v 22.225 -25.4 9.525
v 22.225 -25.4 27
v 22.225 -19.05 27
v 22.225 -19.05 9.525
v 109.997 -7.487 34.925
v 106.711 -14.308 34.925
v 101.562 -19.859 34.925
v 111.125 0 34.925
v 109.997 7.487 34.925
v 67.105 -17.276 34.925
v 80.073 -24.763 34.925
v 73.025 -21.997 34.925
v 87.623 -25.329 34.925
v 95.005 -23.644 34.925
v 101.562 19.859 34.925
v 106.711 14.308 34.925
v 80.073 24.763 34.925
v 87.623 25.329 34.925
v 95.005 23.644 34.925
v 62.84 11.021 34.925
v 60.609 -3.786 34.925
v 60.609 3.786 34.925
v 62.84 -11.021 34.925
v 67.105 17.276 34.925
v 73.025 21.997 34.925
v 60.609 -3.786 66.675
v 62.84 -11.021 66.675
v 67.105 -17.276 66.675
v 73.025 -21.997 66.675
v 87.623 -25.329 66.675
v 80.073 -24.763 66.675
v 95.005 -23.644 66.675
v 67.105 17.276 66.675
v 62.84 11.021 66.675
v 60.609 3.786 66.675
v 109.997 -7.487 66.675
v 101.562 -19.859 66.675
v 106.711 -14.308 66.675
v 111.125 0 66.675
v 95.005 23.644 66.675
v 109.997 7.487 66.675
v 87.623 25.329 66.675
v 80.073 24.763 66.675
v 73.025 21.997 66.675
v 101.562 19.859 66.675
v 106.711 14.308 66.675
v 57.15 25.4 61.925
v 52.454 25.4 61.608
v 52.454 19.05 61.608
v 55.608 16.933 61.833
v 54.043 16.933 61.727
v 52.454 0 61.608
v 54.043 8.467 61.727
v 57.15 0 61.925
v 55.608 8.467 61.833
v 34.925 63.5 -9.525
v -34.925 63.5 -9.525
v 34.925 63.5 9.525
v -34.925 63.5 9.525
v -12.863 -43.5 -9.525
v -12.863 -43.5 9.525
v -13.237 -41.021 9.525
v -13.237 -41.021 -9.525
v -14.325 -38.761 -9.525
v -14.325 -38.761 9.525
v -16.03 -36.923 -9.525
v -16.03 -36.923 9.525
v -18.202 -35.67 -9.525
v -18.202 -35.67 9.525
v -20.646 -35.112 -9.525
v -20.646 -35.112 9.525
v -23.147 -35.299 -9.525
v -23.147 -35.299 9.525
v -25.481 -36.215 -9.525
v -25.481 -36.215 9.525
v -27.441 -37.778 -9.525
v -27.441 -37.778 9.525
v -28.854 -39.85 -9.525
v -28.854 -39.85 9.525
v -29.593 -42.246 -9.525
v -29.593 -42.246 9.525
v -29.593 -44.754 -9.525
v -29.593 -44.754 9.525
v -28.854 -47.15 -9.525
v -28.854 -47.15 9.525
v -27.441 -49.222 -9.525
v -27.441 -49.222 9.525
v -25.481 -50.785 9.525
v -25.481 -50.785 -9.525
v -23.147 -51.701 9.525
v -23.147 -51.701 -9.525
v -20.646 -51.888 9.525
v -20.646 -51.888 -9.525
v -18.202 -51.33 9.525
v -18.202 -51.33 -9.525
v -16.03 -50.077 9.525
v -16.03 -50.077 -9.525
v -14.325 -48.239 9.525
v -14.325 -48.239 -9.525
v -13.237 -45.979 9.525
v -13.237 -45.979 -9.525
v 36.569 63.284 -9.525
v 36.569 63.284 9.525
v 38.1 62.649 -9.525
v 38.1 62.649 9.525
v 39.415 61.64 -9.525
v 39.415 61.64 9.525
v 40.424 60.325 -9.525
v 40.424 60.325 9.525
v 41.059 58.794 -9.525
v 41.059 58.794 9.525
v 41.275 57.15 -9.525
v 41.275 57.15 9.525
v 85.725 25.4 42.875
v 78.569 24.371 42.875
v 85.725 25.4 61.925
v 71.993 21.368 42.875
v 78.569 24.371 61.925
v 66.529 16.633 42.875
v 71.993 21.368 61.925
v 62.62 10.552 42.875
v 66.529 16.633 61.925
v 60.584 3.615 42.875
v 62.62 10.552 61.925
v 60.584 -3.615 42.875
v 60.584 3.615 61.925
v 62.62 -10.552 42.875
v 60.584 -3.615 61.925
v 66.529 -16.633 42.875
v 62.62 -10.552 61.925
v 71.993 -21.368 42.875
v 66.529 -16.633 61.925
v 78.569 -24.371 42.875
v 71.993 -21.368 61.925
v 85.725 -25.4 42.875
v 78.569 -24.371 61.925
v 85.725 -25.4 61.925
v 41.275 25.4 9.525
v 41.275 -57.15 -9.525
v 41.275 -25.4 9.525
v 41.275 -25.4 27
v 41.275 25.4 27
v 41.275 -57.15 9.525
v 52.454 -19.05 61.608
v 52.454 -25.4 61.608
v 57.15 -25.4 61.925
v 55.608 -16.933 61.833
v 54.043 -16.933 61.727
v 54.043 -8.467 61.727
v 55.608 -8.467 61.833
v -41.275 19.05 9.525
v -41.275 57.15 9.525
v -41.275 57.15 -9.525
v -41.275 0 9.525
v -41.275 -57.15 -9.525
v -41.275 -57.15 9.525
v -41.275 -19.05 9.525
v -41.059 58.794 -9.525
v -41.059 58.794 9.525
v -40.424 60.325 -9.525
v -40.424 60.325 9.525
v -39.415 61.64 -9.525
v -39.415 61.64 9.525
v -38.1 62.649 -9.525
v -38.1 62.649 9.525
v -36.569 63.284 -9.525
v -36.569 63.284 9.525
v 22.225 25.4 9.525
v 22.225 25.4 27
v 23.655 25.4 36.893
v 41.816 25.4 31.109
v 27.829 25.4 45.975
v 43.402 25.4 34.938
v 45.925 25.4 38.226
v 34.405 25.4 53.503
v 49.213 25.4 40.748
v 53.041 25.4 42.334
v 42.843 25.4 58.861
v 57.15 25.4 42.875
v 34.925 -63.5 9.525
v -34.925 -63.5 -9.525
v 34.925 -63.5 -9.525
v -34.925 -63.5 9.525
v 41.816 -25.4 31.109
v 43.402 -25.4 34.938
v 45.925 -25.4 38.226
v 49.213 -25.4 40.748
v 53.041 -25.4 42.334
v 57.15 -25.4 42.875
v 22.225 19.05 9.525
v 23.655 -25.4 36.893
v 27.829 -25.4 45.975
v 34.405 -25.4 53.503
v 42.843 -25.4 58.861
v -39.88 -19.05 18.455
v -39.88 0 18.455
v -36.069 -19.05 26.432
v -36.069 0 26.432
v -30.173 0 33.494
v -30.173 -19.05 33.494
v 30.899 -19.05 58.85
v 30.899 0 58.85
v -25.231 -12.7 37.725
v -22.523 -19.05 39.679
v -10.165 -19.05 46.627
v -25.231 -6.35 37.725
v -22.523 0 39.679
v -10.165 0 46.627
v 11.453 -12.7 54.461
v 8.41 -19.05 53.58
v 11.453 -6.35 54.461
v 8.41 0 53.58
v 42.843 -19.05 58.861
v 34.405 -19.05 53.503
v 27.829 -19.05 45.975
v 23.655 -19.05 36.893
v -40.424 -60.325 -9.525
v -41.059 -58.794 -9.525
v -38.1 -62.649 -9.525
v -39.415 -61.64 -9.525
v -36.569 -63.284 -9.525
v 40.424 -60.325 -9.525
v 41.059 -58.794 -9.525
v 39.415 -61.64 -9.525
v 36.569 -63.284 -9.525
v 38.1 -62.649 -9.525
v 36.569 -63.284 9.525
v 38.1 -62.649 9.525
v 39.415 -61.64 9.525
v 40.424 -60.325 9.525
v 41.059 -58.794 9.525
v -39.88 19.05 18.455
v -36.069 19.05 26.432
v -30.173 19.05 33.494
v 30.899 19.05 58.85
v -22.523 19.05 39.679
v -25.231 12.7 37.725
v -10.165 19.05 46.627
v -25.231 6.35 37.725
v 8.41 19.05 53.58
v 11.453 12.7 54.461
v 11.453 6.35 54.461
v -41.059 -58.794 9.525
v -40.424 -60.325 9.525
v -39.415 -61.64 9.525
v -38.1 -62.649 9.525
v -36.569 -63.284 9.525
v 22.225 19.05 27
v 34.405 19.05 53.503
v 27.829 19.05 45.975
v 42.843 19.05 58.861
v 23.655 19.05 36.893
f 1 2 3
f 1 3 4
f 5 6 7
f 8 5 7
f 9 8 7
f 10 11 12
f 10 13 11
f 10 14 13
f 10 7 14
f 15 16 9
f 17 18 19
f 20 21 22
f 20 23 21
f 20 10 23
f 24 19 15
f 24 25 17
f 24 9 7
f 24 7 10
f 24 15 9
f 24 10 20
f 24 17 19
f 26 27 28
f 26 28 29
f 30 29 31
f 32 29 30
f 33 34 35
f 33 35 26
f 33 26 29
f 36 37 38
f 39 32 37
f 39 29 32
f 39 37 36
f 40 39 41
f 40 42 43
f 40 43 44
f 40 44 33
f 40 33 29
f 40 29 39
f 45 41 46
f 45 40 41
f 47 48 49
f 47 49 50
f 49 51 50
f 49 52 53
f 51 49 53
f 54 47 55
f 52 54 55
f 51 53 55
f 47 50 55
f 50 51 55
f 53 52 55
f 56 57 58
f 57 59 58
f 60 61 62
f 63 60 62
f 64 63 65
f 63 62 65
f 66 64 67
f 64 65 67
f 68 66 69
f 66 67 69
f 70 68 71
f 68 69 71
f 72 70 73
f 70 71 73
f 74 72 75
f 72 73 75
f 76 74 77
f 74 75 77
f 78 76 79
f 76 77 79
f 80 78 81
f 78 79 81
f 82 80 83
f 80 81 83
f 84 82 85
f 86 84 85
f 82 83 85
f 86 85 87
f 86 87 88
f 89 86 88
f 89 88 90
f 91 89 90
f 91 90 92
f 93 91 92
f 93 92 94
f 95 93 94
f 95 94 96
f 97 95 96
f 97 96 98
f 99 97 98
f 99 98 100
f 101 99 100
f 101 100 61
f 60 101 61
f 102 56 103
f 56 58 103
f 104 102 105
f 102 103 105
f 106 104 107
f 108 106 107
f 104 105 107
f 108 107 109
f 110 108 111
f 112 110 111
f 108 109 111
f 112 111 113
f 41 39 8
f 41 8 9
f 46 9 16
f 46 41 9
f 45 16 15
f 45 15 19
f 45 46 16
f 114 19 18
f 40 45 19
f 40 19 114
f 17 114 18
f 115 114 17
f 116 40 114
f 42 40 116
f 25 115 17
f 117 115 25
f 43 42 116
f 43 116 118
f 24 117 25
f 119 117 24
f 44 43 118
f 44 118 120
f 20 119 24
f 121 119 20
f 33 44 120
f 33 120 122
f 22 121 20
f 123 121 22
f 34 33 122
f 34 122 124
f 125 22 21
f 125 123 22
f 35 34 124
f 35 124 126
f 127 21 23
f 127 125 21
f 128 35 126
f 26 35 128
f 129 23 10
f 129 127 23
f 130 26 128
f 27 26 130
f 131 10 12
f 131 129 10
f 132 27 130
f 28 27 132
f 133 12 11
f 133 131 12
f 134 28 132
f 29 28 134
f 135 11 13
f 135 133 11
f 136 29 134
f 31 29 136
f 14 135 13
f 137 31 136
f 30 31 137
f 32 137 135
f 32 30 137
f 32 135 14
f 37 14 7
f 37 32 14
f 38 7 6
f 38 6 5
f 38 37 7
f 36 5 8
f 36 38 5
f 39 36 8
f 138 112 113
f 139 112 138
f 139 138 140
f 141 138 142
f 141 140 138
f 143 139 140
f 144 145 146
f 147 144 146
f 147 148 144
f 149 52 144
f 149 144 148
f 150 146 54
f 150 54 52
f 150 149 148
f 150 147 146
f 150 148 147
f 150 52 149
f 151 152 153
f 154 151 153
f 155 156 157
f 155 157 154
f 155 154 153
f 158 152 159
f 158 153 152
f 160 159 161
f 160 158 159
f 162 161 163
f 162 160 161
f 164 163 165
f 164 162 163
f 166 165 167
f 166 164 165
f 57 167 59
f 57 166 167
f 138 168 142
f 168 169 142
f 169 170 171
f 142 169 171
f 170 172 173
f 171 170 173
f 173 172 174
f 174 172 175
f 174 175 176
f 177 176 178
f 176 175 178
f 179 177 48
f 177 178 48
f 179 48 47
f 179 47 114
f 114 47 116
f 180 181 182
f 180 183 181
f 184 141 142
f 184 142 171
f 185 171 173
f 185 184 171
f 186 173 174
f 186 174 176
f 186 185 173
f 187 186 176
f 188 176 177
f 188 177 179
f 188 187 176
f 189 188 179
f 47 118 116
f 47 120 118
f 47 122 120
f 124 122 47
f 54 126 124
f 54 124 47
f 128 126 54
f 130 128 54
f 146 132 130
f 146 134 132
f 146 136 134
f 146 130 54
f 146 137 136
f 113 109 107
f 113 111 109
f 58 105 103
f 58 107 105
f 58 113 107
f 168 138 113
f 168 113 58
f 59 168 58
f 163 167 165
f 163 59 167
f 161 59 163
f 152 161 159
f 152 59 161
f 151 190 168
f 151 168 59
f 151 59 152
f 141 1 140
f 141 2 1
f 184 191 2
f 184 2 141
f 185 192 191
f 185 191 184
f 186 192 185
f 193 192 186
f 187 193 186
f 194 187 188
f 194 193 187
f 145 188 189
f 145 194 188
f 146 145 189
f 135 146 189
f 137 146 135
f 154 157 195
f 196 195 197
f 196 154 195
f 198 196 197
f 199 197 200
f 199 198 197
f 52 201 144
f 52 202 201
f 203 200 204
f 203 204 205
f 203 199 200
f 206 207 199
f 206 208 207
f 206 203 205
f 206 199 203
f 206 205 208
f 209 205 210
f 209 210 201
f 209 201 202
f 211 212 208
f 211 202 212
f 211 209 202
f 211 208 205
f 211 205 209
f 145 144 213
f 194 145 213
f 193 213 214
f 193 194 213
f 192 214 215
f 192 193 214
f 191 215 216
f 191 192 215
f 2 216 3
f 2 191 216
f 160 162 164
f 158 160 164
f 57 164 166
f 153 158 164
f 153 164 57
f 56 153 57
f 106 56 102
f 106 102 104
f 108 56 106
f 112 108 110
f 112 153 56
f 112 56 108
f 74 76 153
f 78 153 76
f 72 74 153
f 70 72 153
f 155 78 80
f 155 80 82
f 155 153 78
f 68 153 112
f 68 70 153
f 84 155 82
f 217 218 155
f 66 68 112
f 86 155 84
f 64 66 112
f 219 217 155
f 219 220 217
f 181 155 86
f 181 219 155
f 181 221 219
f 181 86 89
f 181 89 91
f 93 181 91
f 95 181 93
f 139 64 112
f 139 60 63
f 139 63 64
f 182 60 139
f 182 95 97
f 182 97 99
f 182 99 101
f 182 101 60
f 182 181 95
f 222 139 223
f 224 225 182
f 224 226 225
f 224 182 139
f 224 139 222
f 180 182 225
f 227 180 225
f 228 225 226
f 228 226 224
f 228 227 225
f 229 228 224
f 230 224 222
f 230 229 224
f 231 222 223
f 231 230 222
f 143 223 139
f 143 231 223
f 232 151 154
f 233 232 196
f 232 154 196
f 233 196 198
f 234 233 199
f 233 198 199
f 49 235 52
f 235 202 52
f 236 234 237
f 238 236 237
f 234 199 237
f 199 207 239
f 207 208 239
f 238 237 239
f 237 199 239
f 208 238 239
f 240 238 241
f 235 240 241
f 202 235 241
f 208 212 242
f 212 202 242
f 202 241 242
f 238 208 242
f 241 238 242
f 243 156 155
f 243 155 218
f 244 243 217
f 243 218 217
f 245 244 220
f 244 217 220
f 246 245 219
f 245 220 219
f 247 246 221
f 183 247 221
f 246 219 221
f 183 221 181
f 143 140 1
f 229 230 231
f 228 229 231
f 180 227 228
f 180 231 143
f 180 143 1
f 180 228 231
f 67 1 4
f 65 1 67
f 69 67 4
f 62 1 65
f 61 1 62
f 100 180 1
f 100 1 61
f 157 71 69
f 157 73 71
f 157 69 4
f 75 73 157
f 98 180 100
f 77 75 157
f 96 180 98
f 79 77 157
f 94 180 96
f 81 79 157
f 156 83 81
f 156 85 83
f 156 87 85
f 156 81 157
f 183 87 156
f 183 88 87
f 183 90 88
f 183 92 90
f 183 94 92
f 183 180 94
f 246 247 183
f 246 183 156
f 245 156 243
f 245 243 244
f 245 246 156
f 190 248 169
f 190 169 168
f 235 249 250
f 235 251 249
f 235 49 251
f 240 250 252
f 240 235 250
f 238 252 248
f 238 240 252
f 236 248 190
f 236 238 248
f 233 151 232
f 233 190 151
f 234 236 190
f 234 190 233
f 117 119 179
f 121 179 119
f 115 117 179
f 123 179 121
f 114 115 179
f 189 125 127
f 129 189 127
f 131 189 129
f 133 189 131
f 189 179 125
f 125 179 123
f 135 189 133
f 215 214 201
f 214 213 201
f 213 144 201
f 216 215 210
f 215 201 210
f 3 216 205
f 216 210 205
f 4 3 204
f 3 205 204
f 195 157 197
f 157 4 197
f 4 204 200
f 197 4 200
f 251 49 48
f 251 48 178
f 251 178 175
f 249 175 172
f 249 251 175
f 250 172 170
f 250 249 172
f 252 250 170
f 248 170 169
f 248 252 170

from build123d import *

# Parameters (mm, degrees)
F1_DEPTH = 63.5
F0_W     = 25.4
F0_H     = 19.05
F2_DEPTH = 25.4
F4_DEPTH = 19.05
F5_R     = 6.35
F6_R     = 8.4119474029
F7_DEPTH = 19.051


with BuildPart() as f1:
    # F0 (on Front) → F1 (new body, symmetric)
    with BuildSketch(Plane.XZ):
        Polygon((-41.275, -9.525), (41.275, -9.525), (41.275, 9.525), (22.225, 9.525), (-41.275, 9.525), align=None)
    extrude(amount=F1_DEPTH, both=True)

    # F0 (on Front) → F2 (join, symmetric)
    with BuildSketch(Plane.XZ):
        with BuildLine():
            Line((22.225, 9.525), (41.275, 9.525))
            Line((41.275, 9.525), (41.275, 27.0002))
            ThreePointArc((41.275, 27.0002), (45.9246798487, 38.2255201513), (57.15, 42.8752))
            Line((57.15, 42.8752), (60.325, 42.8752))
            Line((60.325, 42.8752), (60.325, 61.9252))
            Line((60.325, 61.9252), (57.15, 61.9252))
            add(Edge.make_bspline(
                [(52.4539686953, 61.608044703), (54.0535682544, 61.7343536361), (55.620779482, 61.8398573918), (57.15, 61.9252)],
                knots=[106.9681475328, 106.9681475328, 106.9681475328, 106.9681475328, 111.5045361635, 111.5045361635, 111.5045361635, 111.5045361635], degree=3))
            ThreePointArc((52.4539686953, 61.608044703), (30.8463451369, 49.9756948987), (22.225, 27.0002))
            Line((22.225, 27.0002), (22.225, 9.525))
        make_face()
        with Locations((73.025, 52.4002)):
            Rectangle(F0_W, F0_H)
    extrude(amount=F2_DEPTH, both=True)

    # F0 (on Front) → F3 (revolve)
    with BuildSketch(Plane.XZ):
        Polygon((85.725, 61.9252), (85.725, 42.8752), (85.725, 34.925), (111.125, 34.925), (111.125, 66.675), (85.725, 66.675), align=None)
    revolve(axis=Axis((85.725, 0, 50.8), (0, 0, 1)))

    # F0 (on Front) → F4 (join, symmetric)
    with BuildSketch(Plane.XZ):
        with BuildLine():
            add(Edge.make_bspline(
                [(-41.275, 9.525), (-40.9916978958, 44.0832673995), (14.7353745544, 58.6296771756), (52.4539686953, 61.608044703)],
                knots=[0, 0, 0, 0, 106.9681475328, 106.9681475328, 106.9681475328, 106.9681475328], degree=3))
            Line((-41.275, 9.525), (22.225, 9.525))
            Line((22.225, 9.525), (22.225, 27.0002))
            ThreePointArc((22.225, 27.0002), (30.8463451369, 49.9756948987), (52.4539686953, 61.608044703))
        make_face()
    extrude(amount=F4_DEPTH, both=True)

    # F5
    f5_edges = [f1.edges().sort_by_distance(p)[0] for p in [
        (41.275, -63.5, 0),
        (-41.275, -63.5, 0),
        (41.275, 63.5, 0),
        (-41.275, 63.5, 0),
    ]]
    fillet(f5_edges, radius=F5_R)

    # F6 (on face) → F7 (cut, through all)
    with BuildSketch(Plane.XY.offset(9.525)):
        with Locations((-21.275, -43.5)):
            Circle(F6_R)
    extrude(amount=-F7_DEPTH, mode=Mode.SUBTRACT)


solid = f1.part
